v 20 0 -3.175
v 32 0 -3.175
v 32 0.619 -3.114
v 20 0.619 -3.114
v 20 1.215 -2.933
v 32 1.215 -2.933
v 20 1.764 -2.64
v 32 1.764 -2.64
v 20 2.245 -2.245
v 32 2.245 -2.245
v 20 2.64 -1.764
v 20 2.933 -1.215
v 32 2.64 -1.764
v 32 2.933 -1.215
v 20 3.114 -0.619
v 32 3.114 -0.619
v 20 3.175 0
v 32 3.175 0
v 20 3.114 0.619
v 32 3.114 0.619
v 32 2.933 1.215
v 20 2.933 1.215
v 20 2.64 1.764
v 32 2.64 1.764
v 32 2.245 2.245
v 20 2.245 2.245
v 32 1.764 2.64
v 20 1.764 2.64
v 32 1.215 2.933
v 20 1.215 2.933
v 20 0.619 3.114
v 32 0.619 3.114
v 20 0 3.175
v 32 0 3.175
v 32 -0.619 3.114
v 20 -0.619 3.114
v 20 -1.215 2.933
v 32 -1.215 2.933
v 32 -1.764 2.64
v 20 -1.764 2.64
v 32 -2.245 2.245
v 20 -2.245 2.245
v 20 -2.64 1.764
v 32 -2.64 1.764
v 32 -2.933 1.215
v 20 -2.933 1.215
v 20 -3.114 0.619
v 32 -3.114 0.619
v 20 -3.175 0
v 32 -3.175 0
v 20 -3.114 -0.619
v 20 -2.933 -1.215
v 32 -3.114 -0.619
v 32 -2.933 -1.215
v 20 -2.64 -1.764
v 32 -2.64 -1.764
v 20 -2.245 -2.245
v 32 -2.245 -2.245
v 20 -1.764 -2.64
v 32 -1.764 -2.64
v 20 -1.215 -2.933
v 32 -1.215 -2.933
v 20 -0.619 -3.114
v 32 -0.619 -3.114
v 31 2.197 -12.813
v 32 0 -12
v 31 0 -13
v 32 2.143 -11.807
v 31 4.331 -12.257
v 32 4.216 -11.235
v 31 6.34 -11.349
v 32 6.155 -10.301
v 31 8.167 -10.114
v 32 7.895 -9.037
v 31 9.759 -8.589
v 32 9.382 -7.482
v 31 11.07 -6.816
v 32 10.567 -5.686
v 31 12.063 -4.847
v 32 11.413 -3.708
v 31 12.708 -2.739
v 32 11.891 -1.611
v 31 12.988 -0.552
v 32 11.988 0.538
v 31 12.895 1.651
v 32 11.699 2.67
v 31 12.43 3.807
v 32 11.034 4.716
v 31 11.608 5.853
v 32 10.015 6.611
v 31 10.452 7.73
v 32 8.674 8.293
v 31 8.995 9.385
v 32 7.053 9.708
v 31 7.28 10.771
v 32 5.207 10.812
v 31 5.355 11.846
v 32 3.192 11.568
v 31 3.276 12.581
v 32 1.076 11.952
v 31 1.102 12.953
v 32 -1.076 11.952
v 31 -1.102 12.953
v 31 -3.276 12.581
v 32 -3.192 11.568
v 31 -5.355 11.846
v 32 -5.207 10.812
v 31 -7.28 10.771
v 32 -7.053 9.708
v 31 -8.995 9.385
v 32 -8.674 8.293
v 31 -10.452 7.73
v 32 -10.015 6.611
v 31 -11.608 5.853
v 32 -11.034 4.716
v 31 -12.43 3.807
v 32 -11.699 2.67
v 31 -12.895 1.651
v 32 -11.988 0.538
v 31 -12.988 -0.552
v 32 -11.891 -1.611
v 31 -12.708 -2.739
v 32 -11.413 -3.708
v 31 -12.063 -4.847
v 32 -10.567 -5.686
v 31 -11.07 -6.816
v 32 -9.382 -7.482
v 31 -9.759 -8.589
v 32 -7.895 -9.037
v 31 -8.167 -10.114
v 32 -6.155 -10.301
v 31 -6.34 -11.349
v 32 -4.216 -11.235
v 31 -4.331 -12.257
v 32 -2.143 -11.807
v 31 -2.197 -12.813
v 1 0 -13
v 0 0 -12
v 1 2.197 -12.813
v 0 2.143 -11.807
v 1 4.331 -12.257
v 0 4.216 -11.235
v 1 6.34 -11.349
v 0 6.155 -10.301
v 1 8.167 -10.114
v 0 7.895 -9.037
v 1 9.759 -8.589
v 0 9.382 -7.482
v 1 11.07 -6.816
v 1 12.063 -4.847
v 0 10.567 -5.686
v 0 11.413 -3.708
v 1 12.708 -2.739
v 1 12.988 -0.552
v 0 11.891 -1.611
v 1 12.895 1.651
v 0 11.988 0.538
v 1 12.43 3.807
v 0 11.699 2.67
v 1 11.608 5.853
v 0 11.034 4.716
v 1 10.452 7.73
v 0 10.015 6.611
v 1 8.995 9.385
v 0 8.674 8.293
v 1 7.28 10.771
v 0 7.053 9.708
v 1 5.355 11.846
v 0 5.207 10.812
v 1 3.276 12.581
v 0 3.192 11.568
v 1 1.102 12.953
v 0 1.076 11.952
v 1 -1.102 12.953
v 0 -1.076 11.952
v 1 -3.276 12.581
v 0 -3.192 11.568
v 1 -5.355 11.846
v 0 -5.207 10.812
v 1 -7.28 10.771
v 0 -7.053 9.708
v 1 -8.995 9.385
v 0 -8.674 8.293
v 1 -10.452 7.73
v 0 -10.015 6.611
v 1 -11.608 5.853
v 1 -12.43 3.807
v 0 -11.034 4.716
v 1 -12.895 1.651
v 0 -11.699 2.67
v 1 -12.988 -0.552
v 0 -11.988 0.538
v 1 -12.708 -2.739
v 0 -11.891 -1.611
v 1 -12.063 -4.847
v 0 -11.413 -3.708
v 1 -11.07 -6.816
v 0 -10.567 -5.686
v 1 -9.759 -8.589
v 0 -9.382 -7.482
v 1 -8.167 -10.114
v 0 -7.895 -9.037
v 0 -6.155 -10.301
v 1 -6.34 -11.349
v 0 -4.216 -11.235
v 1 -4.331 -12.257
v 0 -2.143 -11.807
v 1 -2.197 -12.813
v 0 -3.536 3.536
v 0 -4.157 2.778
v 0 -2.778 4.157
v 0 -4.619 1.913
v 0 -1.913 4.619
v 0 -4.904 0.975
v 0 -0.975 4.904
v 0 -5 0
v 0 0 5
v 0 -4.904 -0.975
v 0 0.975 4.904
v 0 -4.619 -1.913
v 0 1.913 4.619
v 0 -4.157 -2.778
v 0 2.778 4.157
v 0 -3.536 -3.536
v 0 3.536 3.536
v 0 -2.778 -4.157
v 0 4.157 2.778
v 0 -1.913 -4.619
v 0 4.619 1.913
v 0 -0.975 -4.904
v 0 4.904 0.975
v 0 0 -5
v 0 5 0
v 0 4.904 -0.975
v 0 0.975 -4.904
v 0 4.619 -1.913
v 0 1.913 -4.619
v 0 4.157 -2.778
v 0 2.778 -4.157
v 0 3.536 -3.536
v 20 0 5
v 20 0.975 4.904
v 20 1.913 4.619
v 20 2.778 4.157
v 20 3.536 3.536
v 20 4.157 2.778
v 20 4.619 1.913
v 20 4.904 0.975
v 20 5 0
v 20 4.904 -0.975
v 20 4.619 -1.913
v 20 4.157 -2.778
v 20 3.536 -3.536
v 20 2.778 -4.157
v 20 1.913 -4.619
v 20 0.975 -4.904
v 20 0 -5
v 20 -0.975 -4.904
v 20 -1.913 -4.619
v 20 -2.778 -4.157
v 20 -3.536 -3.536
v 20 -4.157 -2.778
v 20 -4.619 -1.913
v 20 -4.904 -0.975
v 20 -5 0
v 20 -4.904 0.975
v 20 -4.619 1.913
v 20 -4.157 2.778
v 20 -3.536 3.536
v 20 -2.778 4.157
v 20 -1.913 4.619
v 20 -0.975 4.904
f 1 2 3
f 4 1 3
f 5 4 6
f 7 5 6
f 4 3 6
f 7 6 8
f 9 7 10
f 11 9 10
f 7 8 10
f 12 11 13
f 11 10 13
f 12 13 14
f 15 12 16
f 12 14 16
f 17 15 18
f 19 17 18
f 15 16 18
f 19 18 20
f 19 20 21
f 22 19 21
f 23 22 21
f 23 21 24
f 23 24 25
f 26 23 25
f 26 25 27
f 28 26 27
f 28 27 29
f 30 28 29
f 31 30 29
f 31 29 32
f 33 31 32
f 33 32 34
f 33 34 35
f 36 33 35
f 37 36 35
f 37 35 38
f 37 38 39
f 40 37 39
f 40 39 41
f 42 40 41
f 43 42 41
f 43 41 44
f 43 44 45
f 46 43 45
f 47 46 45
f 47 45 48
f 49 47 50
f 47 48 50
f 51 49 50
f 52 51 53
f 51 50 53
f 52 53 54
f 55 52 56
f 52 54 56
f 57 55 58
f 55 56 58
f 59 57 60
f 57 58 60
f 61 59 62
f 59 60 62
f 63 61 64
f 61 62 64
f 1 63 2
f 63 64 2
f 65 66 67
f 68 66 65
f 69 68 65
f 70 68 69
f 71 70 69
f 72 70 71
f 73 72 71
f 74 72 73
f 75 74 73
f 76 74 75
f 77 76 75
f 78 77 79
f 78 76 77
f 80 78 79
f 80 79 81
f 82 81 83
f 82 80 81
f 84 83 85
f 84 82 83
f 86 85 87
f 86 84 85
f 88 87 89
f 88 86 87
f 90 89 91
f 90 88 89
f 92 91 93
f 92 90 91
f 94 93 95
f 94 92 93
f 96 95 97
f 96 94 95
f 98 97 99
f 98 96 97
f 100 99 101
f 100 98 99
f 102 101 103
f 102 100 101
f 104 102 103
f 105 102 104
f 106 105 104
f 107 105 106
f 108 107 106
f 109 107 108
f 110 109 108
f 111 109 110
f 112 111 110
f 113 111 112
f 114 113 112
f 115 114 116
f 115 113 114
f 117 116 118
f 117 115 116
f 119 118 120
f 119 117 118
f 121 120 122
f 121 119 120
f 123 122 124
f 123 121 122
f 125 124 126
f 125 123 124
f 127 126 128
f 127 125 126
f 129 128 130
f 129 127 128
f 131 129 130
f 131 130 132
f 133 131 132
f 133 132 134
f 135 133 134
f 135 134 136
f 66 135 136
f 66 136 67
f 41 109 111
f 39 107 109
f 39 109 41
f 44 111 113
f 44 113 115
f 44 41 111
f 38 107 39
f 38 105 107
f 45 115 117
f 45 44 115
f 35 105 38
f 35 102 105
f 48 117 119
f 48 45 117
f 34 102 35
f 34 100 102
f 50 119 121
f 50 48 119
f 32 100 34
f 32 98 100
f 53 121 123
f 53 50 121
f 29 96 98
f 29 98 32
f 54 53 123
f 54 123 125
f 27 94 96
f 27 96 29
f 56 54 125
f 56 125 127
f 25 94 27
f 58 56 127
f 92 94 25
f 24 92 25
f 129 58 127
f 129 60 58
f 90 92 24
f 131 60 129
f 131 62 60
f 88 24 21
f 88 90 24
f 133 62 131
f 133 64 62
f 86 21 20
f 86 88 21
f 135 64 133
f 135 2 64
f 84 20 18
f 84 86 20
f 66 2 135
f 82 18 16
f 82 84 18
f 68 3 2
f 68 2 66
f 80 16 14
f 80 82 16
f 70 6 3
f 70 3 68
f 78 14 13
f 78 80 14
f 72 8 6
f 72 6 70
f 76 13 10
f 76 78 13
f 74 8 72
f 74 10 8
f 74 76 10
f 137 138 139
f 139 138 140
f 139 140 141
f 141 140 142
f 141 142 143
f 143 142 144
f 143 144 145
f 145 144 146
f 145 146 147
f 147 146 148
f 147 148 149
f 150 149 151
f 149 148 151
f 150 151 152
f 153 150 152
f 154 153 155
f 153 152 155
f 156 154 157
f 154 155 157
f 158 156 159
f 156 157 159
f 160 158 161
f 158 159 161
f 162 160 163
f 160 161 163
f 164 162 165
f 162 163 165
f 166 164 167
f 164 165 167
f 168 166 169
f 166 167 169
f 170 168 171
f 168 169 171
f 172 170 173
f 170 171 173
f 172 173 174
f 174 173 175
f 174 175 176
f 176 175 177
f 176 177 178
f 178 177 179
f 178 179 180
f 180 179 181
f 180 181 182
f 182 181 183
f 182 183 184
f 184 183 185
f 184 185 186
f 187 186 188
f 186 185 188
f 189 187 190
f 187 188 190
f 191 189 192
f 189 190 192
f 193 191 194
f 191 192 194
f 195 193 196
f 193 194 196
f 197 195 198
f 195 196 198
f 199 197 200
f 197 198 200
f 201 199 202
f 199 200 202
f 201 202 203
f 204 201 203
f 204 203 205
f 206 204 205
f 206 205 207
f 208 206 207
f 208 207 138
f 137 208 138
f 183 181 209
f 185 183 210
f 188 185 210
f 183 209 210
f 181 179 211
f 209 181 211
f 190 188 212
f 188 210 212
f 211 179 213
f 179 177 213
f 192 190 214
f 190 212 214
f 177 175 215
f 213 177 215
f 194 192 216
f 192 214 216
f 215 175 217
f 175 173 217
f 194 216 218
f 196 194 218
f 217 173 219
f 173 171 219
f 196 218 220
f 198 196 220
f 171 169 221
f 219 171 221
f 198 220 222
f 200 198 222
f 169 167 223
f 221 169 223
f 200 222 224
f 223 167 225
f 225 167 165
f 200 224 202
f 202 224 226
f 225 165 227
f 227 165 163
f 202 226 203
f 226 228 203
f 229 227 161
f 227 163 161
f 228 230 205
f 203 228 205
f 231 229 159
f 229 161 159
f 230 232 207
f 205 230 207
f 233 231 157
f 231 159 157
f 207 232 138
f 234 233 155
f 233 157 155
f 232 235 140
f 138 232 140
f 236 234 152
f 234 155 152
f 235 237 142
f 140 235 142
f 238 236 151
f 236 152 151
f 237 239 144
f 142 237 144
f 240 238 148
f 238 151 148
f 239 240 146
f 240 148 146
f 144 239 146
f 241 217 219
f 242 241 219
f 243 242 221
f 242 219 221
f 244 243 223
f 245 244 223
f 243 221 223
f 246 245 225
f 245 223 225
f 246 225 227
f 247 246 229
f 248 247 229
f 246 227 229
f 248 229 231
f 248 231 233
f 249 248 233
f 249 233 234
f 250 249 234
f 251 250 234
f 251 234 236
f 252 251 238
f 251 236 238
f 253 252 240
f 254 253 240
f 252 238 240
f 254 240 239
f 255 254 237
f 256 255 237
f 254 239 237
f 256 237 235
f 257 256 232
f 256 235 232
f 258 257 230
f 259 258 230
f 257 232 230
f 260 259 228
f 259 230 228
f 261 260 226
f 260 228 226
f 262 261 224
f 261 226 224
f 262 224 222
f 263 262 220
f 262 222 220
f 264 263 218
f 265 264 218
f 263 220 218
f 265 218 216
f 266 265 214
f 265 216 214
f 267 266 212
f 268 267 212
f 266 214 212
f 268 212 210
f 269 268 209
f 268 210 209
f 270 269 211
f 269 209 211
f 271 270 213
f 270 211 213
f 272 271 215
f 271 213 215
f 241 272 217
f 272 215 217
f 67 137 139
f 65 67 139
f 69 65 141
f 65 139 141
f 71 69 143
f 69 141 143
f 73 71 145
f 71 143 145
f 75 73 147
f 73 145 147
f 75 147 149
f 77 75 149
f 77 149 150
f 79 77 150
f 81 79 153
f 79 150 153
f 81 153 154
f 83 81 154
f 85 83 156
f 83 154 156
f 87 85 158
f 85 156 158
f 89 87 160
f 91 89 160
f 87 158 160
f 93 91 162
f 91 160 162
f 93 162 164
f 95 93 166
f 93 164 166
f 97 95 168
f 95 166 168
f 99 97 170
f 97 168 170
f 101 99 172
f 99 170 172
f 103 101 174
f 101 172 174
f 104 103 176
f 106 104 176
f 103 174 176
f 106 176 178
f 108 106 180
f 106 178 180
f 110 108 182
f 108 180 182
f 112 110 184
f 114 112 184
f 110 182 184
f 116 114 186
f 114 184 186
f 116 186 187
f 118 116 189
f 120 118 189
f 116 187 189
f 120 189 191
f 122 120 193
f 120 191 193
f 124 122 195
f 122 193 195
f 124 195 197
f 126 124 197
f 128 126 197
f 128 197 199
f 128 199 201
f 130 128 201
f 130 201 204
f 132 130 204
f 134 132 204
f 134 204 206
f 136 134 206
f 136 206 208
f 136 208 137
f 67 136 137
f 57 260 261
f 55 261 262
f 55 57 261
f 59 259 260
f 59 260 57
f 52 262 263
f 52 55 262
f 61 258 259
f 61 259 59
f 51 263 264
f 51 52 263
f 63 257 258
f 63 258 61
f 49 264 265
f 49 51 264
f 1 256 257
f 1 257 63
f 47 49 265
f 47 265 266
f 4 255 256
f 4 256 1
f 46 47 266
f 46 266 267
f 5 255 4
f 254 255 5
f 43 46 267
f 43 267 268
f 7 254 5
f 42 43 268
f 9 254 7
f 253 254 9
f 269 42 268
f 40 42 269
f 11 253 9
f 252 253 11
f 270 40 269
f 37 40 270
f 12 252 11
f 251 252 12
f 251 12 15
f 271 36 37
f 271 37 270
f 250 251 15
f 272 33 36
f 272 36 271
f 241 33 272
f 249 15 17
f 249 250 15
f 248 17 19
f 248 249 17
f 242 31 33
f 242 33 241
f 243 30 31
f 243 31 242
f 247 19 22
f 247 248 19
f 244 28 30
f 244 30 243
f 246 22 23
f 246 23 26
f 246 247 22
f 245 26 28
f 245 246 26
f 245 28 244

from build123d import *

# Parameters (mm, degrees)
SKETCH1_R           = 13
BOSS_EXTRUDE1_DEPTH = 32
SKETCH2_R           = 3.175
CUT_EXTRUDE1_DEPTH  = 37.905284174
SKETCH3_R           = 5
CUT_EXTRUDE2_DEPTH  = 20
CHAMFER1_SIZE       = 1


with BuildPart() as part:
    # Sketch1 → Boss-Extrude1 (new body)
    with BuildSketch(Plane(origin=(0, 0, 0), x_dir=(0, 0, -1), z_dir=(1, 0, 0))):
        Circle(SKETCH1_R)
    extrude(amount=BOSS_EXTRUDE1_DEPTH)

    # Sketch2 → Cut-Extrude1 (cut, through all)
    with BuildSketch(Plane(origin=(32, 0, 0), x_dir=(0, 0, -1), z_dir=(1, 0, 0))):
        Circle(SKETCH2_R)
    extrude(amount=-CUT_EXTRUDE1_DEPTH, mode=Mode.SUBTRACT)

    # Sketch3 → Cut-Extrude2 (cut)
    with BuildSketch(Plane.ZY):
        Circle(SKETCH3_R)
    extrude(amount=-CUT_EXTRUDE2_DEPTH, mode=Mode.SUBTRACT)

    # Chamfer1
    chamfer1_edges = [part.edges().sort_by_distance(p)[0] for p in [
        (0, 0, 13),
        (32, 0, 13),
    ]]
    chamfer(chamfer1_edges, length=CHAMFER1_SIZE)


solid = part.part
